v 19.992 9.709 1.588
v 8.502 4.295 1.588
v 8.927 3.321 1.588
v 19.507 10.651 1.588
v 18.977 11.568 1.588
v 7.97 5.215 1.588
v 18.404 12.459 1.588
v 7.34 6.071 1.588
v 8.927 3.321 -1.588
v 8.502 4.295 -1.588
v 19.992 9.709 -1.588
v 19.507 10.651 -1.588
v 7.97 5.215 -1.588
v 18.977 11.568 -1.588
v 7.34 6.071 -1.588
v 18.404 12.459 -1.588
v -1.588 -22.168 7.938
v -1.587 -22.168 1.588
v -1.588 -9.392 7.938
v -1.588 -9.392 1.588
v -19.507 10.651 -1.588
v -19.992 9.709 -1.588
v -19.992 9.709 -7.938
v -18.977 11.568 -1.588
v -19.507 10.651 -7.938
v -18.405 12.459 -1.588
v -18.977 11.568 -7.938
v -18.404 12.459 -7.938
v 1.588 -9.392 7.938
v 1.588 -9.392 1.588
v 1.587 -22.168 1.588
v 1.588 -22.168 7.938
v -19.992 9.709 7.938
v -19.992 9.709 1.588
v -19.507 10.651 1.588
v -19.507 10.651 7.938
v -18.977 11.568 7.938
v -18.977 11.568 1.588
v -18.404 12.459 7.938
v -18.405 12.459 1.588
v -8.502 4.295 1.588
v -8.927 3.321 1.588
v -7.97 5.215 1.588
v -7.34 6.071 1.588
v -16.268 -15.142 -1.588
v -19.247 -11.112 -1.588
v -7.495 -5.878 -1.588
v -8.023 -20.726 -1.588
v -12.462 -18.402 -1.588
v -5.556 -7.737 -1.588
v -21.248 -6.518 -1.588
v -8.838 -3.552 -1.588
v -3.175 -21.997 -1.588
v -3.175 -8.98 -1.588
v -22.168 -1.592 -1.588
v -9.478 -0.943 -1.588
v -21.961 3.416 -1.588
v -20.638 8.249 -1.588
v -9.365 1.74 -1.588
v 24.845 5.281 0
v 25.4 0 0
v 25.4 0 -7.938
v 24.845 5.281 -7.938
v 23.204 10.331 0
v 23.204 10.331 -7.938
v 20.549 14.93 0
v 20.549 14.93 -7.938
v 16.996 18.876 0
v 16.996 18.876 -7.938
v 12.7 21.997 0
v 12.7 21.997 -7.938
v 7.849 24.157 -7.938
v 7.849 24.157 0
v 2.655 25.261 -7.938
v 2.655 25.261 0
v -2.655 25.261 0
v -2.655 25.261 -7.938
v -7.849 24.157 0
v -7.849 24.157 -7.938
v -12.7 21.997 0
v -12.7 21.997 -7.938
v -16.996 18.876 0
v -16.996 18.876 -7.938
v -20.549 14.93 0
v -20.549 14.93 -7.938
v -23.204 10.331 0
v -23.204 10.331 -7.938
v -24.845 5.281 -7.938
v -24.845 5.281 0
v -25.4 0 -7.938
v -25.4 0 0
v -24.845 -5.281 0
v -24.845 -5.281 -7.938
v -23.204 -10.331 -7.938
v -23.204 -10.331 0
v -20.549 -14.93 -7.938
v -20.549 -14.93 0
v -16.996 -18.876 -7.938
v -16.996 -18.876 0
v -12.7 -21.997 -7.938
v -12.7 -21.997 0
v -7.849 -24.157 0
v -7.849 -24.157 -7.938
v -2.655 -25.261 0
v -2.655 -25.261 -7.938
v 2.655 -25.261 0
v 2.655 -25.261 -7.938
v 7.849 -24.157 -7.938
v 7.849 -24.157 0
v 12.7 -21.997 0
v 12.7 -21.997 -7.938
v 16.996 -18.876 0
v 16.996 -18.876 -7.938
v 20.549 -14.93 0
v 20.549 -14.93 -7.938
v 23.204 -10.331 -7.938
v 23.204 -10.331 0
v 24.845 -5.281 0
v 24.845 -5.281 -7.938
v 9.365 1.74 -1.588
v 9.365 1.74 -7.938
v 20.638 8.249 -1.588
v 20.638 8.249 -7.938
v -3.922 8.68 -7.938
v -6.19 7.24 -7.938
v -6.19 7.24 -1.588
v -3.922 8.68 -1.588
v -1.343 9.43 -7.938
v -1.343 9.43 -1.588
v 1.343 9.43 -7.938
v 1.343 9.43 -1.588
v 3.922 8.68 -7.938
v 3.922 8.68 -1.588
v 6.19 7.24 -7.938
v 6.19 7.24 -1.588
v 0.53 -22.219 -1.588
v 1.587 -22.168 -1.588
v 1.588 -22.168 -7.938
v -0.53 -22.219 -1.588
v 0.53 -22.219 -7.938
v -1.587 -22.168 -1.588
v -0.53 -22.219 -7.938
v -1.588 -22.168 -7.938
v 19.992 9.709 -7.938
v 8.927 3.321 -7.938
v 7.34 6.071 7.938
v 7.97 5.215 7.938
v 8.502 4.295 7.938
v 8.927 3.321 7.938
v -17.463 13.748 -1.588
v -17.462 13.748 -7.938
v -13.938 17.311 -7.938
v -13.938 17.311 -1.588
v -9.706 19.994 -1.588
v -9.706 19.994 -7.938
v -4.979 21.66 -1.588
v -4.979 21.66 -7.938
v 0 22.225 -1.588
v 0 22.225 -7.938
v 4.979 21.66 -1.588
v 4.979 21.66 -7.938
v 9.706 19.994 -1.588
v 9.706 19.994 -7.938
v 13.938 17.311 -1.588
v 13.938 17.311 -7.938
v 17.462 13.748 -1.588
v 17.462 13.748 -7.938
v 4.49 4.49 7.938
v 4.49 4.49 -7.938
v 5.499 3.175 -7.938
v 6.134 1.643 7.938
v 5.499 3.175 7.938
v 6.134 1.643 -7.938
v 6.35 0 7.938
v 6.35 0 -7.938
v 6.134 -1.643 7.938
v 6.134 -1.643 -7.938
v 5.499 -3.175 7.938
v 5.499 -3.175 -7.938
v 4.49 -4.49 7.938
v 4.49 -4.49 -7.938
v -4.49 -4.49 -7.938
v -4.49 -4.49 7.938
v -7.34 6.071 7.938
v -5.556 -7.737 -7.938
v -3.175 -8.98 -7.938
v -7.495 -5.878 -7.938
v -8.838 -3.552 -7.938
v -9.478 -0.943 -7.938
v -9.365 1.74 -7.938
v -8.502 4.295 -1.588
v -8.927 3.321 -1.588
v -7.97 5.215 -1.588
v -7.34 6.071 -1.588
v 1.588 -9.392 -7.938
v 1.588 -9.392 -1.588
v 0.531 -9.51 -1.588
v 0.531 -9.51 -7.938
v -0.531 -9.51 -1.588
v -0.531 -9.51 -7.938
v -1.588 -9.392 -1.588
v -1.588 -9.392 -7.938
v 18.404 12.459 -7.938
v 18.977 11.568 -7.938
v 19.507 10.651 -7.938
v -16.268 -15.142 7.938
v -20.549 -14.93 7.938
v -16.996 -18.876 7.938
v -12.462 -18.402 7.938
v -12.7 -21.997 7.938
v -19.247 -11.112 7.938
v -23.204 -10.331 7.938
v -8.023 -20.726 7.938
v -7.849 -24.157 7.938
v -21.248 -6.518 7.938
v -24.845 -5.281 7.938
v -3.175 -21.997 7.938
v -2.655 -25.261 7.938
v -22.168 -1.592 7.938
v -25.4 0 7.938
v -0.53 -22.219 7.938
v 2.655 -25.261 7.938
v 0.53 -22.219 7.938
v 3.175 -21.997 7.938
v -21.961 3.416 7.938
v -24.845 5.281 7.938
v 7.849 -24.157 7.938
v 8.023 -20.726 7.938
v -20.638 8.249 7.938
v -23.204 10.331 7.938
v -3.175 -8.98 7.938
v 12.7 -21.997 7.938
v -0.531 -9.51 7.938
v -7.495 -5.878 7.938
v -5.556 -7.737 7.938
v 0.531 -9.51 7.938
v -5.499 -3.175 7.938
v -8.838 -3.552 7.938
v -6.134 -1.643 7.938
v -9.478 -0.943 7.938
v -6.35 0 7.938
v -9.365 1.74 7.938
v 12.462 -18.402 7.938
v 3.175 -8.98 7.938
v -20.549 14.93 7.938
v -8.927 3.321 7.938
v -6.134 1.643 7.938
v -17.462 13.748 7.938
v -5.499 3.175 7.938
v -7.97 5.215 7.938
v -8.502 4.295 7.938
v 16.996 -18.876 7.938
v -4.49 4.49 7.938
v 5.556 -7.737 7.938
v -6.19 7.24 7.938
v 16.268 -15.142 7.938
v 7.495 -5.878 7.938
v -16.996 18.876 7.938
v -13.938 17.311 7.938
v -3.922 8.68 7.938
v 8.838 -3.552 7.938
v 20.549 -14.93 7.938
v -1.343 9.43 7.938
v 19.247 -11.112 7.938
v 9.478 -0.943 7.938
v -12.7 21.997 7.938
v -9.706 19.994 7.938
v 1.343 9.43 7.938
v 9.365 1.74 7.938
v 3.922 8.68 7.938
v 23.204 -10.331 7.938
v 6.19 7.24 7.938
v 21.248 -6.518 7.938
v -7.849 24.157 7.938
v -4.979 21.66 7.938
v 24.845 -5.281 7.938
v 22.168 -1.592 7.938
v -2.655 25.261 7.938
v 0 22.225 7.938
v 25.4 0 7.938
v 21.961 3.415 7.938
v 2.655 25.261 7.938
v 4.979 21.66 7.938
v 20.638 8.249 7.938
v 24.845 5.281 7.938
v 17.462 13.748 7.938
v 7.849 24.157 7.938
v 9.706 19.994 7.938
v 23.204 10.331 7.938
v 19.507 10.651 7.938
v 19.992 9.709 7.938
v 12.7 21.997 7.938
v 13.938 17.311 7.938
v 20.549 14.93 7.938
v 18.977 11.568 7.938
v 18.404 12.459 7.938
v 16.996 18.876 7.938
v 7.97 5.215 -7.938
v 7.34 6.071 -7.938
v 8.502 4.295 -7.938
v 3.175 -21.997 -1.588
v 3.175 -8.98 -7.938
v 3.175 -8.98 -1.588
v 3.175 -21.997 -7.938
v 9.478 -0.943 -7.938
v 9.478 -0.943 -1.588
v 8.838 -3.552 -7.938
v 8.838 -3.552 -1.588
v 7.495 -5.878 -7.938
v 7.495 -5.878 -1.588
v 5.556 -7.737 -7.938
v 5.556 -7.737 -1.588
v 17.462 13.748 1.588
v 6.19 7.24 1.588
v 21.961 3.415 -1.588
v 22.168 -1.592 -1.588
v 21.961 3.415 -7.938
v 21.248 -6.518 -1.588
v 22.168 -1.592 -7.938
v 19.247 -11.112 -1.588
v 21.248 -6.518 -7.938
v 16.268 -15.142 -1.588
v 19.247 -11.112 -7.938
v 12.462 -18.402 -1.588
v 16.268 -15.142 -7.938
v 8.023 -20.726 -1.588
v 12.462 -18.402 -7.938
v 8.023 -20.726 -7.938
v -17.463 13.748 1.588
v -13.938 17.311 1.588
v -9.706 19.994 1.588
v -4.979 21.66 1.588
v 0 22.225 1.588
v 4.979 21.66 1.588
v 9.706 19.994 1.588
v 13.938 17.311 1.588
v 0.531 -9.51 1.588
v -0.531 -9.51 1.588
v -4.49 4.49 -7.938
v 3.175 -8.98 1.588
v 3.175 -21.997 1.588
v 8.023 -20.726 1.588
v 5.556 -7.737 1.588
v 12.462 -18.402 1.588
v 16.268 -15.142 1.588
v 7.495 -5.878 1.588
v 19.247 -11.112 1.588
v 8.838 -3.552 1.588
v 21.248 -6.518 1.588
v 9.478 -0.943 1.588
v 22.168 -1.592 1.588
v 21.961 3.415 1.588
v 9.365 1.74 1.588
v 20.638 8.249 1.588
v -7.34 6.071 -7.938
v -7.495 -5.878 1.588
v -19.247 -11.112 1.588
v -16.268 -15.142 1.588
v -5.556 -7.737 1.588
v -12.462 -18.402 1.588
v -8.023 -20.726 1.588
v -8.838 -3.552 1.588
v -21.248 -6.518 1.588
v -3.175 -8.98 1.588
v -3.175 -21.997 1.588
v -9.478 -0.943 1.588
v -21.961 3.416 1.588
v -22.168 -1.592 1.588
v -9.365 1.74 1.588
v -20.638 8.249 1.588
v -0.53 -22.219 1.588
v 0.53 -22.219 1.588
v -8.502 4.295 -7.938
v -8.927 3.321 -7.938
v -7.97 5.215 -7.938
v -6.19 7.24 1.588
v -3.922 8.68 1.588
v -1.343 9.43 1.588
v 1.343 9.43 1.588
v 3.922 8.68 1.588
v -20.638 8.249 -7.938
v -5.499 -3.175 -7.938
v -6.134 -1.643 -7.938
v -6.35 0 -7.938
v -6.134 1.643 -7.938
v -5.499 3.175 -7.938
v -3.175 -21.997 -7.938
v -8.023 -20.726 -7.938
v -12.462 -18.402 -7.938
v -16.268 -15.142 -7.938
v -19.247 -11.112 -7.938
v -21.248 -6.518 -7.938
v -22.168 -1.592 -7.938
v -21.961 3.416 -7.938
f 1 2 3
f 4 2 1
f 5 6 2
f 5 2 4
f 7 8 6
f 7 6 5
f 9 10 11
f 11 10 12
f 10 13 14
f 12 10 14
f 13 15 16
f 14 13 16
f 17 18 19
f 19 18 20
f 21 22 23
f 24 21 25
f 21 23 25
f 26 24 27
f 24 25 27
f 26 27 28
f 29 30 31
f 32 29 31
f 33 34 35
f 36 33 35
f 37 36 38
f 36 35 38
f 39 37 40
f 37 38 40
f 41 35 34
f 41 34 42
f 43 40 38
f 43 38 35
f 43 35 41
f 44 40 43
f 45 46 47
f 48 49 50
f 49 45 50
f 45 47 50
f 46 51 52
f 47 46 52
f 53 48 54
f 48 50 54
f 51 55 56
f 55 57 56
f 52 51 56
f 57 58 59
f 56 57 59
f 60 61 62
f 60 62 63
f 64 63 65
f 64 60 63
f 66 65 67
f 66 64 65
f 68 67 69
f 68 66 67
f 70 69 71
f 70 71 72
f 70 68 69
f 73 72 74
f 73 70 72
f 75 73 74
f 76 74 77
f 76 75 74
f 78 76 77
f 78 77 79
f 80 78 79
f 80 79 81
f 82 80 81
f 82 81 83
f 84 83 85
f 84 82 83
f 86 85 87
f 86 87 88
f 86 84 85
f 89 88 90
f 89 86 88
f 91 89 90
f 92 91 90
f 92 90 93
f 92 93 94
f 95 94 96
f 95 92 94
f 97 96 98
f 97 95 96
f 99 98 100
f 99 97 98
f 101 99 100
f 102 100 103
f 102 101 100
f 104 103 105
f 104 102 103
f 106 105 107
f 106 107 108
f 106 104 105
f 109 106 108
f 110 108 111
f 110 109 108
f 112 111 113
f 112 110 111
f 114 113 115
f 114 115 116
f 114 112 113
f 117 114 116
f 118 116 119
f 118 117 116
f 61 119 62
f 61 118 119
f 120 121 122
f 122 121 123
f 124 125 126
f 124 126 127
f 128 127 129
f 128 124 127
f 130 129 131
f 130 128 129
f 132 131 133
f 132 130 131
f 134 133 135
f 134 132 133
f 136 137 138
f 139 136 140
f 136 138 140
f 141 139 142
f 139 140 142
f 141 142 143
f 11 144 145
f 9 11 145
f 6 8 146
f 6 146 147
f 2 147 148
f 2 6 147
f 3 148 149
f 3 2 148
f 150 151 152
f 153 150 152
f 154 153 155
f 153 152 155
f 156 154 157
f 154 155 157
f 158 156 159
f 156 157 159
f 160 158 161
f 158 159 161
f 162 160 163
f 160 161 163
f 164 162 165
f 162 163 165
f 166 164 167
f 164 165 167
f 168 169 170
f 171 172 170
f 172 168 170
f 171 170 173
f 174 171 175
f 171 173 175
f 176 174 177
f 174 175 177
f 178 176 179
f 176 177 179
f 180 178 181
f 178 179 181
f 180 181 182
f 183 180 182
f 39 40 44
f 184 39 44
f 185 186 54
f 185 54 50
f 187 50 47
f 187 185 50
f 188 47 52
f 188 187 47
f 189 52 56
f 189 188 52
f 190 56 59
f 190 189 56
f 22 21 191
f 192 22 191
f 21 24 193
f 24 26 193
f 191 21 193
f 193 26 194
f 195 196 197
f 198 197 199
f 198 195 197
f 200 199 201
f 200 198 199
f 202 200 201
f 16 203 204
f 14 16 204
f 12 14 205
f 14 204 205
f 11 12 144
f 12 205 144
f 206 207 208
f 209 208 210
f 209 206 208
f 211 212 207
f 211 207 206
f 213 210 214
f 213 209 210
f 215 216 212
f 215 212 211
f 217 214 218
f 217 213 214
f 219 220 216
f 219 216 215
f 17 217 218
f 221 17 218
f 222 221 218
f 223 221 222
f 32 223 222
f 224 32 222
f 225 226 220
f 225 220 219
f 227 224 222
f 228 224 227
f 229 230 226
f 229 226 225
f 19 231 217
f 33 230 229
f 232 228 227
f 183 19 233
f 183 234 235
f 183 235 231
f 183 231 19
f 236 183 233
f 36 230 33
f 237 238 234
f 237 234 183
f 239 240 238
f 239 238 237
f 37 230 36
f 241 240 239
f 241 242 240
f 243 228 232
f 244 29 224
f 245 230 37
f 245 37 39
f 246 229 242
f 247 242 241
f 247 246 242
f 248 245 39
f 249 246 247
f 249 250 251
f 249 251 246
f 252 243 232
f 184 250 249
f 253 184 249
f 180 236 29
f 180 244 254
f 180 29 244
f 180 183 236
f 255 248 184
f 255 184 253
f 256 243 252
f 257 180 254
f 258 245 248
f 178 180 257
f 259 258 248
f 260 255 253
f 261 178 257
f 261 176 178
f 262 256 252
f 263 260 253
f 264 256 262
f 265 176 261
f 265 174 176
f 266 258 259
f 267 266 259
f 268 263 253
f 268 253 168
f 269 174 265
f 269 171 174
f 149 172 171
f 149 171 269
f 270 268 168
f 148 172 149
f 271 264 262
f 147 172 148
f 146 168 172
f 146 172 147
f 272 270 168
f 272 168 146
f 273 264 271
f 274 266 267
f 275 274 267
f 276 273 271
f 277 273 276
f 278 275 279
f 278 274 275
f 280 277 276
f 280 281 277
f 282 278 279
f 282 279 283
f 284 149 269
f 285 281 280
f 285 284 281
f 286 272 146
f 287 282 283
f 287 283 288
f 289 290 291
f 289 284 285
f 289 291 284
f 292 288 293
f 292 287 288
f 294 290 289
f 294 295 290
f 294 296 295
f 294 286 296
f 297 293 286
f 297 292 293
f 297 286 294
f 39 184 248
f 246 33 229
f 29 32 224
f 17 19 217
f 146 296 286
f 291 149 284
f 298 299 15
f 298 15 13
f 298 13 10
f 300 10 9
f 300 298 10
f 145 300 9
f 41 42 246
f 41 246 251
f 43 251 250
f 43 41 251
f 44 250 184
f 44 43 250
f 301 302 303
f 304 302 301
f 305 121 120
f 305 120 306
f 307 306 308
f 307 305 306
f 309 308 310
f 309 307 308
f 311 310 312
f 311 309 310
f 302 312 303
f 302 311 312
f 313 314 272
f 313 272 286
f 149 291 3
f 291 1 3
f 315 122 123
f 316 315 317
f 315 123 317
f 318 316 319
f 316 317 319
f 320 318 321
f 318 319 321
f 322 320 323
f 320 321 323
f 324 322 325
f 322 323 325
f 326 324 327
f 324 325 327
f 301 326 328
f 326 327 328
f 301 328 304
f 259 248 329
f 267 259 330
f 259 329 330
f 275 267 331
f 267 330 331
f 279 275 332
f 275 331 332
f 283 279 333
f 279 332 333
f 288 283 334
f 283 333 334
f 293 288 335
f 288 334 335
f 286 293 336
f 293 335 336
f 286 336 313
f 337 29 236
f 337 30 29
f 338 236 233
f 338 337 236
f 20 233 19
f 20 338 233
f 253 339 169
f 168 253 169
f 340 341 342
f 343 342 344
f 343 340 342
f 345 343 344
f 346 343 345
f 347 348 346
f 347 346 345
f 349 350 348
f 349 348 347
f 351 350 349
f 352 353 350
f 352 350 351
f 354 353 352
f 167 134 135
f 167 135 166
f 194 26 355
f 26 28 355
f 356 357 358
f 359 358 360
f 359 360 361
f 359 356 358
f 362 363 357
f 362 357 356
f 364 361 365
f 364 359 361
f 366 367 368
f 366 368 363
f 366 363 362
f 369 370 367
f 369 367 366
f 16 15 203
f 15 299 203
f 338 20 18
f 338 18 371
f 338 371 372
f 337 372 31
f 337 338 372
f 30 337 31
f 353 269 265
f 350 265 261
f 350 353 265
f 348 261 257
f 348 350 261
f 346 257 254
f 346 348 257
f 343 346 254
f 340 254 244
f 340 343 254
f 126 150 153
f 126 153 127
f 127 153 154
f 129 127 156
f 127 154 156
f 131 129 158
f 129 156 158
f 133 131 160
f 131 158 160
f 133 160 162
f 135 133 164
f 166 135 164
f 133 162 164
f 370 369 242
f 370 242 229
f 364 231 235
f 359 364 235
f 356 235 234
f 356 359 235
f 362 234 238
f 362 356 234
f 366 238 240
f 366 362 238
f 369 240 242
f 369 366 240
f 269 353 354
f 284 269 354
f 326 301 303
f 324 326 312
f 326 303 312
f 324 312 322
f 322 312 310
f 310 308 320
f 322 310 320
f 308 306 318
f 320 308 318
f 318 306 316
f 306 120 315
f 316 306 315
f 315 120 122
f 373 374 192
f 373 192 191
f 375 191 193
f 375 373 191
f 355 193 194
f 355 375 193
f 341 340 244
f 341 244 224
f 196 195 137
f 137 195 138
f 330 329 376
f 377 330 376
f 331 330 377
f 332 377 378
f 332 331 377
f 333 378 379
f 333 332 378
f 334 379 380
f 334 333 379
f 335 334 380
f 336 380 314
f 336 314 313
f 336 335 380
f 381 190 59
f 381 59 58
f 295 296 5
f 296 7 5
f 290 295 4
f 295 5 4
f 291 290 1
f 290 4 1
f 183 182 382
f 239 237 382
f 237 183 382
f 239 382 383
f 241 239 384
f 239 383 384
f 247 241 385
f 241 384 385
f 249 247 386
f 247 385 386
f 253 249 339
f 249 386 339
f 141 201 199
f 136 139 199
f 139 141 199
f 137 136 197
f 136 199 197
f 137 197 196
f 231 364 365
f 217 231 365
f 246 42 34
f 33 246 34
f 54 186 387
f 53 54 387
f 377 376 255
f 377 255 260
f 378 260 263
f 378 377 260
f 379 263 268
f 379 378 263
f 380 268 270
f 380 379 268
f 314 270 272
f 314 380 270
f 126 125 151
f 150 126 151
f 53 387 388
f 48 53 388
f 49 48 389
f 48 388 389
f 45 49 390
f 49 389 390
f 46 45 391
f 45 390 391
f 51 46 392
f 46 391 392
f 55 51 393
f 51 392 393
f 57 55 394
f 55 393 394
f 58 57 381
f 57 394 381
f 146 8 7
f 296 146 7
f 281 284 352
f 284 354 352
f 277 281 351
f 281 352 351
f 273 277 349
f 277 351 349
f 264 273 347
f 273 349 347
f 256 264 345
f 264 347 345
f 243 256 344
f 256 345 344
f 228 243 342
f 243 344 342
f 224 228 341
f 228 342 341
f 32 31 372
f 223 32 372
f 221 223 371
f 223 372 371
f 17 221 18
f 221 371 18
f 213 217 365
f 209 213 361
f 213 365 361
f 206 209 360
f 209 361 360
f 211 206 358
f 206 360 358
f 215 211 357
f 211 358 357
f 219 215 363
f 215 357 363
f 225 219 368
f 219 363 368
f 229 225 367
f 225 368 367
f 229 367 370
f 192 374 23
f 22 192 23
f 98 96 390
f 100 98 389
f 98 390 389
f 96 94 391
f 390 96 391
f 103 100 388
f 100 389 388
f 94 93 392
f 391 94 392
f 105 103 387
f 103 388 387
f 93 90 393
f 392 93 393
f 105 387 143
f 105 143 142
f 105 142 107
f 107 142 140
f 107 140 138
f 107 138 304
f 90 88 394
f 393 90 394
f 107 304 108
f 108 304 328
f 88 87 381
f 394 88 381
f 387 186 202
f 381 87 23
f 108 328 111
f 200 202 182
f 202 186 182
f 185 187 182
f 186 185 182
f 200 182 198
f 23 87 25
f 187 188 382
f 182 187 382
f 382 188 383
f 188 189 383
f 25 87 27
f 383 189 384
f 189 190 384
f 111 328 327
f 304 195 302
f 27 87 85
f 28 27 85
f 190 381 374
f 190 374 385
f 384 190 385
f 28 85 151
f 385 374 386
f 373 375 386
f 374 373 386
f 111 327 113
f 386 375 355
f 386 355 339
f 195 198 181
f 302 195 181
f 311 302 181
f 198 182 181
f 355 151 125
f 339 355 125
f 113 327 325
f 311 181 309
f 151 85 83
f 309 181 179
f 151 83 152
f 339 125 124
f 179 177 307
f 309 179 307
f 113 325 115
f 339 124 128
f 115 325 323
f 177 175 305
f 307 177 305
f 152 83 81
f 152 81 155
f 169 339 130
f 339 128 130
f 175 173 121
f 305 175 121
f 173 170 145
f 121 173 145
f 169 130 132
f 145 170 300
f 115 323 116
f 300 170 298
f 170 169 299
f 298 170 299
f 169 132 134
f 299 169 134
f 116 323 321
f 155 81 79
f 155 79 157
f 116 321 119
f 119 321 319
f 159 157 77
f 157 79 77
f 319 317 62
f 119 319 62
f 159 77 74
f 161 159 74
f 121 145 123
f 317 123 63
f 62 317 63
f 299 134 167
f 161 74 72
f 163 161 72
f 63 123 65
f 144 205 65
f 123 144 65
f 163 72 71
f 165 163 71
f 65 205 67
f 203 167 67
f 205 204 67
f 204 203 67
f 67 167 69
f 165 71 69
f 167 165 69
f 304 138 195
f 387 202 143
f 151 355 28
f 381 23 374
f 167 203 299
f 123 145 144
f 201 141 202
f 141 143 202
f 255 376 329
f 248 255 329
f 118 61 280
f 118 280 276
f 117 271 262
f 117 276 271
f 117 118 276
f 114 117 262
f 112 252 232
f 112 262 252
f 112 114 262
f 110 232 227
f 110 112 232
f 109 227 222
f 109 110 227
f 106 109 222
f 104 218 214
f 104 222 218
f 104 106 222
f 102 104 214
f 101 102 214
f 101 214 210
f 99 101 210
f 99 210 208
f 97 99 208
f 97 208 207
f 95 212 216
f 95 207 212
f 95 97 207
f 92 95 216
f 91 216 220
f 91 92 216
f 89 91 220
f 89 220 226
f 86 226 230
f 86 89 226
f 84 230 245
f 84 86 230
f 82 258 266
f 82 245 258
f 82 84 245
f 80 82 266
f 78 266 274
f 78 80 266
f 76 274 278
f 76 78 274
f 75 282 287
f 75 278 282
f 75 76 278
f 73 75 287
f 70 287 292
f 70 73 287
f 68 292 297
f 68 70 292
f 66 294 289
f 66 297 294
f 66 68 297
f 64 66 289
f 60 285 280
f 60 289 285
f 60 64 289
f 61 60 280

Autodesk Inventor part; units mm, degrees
ref_plane "YZ Plane" through (0, 0, 0) normal (1, 0, 0) x (0, 1, 0)
ref_plane "XZ Plane" through (0, 0, 0) normal (0, 1, 0) x (-1, 0, 0)
ref_plane "XY Plane" through (0, 0, 0) normal (0, 0, 1) x (1, 0, 0)
sketch "Sketch1" plane through (0, 0, 0) normal (0, 0, 1) x (1, 0, 0)
  line L0 (-4.4901, 4.4901) -> (4.4901, 4.4901)
  line L1 (4.4901, 4.4901) -> (4.4901, -4.4901) construction
  line L2 (4.4901, -4.4901) -> (-4.4901, -4.4901)
  line L3 (-4.4901, -4.4901) -> (-4.4901, 4.4901) construction
  arc A0 (-4.4901, 4.4901) -> (-4.4901, -4.4901) centre (0, 0) ccw
  arc A1 (4.4901, -4.4901) -> (4.4901, 4.4901) centre (0, 0) ccw
  arc A2 (6.1896, 7.2398) -> (9.3646, 1.7405) centre (0, 0) ccw
  arc A3 (17.4625, 13.7482) -> (20.6375, 8.2489) centre (0, 0) ccw
  circle A4 centre (0, 0) radius 25.4
  line L4 (6.1896, 7.2398) -> (17.4625, 13.7482)
  line L5 (7.3398, 6.0707) -> (18.4045, 12.4589)
  line L6 (19.992, 9.7093) -> (8.9273, 3.3211)
  line L7 (9.3646, 1.7405) -> (20.6375, 8.2489)
  line L8 (0, 0) -> (19.2474, 11.1125) construction
  arc A5 (7.3398, 6.0707) -> (6.1896, 7.2398) centre (0, 0) ccw
  arc A6 (8.9273, 3.3211) -> (7.3398, 6.0707) centre (0, 0) ccw
  arc A7 (9.3646, 1.7405) -> (8.9273, 3.3211) centre (0, 0) ccw
  arc A8 (18.4045, 12.4589) -> (17.4625, 13.7482) centre (0, 0) ccw
  arc A9 (19.992, 9.7093) -> (18.4045, 12.4589) centre (0, 0) ccw
  arc A10 (20.6375, 8.2489) -> (19.992, 9.7093) centre (0, 0) ccw
  line L9 (-9.3646, 1.7405) -> (-20.6375, 8.2489)
  line L10 (-8.9273, 3.3211) -> (-19.992, 9.7093)
  line L11 (-18.4045, 12.4589) -> (-7.3398, 6.0707)
  line L12 (-6.1896, 7.2398) -> (-17.4625, 13.7482)
  arc A11 (-8.9273, 3.3211) -> (-9.3646, 1.7405) centre (0, 0) ccw
  arc A12 (-6.1896, 7.2398) -> (-7.3398, 6.0707) centre (0, 0) ccw
  arc A13 (-19.992, 9.7093) -> (-20.6375, 8.2489) centre (0, 0) ccw
  arc A14 (-17.4625, 13.7482) -> (-18.4045, 12.4589) centre (0, 0) ccw
  line L13 (3.175, -8.9803) -> (3.175, -21.997)
  line L14 (1.5875, -9.3918) -> (1.5875, -22.1682)
  line L15 (-1.5875, -22.1682) -> (-1.5875, -9.3918)
  line L16 (-3.175, -8.9803) -> (-3.175, -21.997)
  arc A15 (1.5875, -9.3918) -> (3.175, -8.9803) centre (0, 0) ccw
  arc A16 (-3.175, -8.9803) -> (-1.5875, -9.3918) centre (0, 0) ccw
  arc A17 (1.5875, -22.1682) -> (3.175, -21.997) centre (0, 0) ccw
  arc A18 (-3.175, -21.997) -> (-1.5875, -22.1682) centre (0, 0) ccw
  dimension "d4" = 6.35
  dimension "d5" = 8.9803
  dimension "d6" = 8.9803
  dimension "d7" = 19.05
  dimension "d8" = 44.45
  dimension "d9" = 50.8
  dimension "d14" = 1.5875
  dimension "d15" = 3.175
  dimension "d16" = 1.5875
  dimension "d17" = 1.5875
  dimension "d18" = 30
  dimension "d21" = 360
extrude "Extrusion1" add sketch "Sketch1" along normal mid plane 15.875 contours A5 A6 A7 A2 | L4 A8 L5 A5 | A2 L11 A3 L12 | L6 A10 L7 A7 | A2 L9 A3 L10 | L13 A3 L14 A2 | A2 L15 A3 L16 | A4
extrude "Extrusion2" add sketch "Sketch1" along normal mid plane 3.175 contours A5 A6 A7 A2 | A2 L12 A3 L4 | A2 L11 A3 L12 | L5 A9 L6 A6 | A2 L10 A3 L11 | A2 L9 A3 L10 | L7 A3 L13 A2 | A2 L16 A3 L9 | L13 A3 L14 A2 | A2 L15 A3 L16 | L14 A3 L15 A2
equation "\"d5\" = d6"
equation "\"d16\" = d14"
equation "\"d17\" = 0.5 * d15"
properties part number "blue wheel hub"
